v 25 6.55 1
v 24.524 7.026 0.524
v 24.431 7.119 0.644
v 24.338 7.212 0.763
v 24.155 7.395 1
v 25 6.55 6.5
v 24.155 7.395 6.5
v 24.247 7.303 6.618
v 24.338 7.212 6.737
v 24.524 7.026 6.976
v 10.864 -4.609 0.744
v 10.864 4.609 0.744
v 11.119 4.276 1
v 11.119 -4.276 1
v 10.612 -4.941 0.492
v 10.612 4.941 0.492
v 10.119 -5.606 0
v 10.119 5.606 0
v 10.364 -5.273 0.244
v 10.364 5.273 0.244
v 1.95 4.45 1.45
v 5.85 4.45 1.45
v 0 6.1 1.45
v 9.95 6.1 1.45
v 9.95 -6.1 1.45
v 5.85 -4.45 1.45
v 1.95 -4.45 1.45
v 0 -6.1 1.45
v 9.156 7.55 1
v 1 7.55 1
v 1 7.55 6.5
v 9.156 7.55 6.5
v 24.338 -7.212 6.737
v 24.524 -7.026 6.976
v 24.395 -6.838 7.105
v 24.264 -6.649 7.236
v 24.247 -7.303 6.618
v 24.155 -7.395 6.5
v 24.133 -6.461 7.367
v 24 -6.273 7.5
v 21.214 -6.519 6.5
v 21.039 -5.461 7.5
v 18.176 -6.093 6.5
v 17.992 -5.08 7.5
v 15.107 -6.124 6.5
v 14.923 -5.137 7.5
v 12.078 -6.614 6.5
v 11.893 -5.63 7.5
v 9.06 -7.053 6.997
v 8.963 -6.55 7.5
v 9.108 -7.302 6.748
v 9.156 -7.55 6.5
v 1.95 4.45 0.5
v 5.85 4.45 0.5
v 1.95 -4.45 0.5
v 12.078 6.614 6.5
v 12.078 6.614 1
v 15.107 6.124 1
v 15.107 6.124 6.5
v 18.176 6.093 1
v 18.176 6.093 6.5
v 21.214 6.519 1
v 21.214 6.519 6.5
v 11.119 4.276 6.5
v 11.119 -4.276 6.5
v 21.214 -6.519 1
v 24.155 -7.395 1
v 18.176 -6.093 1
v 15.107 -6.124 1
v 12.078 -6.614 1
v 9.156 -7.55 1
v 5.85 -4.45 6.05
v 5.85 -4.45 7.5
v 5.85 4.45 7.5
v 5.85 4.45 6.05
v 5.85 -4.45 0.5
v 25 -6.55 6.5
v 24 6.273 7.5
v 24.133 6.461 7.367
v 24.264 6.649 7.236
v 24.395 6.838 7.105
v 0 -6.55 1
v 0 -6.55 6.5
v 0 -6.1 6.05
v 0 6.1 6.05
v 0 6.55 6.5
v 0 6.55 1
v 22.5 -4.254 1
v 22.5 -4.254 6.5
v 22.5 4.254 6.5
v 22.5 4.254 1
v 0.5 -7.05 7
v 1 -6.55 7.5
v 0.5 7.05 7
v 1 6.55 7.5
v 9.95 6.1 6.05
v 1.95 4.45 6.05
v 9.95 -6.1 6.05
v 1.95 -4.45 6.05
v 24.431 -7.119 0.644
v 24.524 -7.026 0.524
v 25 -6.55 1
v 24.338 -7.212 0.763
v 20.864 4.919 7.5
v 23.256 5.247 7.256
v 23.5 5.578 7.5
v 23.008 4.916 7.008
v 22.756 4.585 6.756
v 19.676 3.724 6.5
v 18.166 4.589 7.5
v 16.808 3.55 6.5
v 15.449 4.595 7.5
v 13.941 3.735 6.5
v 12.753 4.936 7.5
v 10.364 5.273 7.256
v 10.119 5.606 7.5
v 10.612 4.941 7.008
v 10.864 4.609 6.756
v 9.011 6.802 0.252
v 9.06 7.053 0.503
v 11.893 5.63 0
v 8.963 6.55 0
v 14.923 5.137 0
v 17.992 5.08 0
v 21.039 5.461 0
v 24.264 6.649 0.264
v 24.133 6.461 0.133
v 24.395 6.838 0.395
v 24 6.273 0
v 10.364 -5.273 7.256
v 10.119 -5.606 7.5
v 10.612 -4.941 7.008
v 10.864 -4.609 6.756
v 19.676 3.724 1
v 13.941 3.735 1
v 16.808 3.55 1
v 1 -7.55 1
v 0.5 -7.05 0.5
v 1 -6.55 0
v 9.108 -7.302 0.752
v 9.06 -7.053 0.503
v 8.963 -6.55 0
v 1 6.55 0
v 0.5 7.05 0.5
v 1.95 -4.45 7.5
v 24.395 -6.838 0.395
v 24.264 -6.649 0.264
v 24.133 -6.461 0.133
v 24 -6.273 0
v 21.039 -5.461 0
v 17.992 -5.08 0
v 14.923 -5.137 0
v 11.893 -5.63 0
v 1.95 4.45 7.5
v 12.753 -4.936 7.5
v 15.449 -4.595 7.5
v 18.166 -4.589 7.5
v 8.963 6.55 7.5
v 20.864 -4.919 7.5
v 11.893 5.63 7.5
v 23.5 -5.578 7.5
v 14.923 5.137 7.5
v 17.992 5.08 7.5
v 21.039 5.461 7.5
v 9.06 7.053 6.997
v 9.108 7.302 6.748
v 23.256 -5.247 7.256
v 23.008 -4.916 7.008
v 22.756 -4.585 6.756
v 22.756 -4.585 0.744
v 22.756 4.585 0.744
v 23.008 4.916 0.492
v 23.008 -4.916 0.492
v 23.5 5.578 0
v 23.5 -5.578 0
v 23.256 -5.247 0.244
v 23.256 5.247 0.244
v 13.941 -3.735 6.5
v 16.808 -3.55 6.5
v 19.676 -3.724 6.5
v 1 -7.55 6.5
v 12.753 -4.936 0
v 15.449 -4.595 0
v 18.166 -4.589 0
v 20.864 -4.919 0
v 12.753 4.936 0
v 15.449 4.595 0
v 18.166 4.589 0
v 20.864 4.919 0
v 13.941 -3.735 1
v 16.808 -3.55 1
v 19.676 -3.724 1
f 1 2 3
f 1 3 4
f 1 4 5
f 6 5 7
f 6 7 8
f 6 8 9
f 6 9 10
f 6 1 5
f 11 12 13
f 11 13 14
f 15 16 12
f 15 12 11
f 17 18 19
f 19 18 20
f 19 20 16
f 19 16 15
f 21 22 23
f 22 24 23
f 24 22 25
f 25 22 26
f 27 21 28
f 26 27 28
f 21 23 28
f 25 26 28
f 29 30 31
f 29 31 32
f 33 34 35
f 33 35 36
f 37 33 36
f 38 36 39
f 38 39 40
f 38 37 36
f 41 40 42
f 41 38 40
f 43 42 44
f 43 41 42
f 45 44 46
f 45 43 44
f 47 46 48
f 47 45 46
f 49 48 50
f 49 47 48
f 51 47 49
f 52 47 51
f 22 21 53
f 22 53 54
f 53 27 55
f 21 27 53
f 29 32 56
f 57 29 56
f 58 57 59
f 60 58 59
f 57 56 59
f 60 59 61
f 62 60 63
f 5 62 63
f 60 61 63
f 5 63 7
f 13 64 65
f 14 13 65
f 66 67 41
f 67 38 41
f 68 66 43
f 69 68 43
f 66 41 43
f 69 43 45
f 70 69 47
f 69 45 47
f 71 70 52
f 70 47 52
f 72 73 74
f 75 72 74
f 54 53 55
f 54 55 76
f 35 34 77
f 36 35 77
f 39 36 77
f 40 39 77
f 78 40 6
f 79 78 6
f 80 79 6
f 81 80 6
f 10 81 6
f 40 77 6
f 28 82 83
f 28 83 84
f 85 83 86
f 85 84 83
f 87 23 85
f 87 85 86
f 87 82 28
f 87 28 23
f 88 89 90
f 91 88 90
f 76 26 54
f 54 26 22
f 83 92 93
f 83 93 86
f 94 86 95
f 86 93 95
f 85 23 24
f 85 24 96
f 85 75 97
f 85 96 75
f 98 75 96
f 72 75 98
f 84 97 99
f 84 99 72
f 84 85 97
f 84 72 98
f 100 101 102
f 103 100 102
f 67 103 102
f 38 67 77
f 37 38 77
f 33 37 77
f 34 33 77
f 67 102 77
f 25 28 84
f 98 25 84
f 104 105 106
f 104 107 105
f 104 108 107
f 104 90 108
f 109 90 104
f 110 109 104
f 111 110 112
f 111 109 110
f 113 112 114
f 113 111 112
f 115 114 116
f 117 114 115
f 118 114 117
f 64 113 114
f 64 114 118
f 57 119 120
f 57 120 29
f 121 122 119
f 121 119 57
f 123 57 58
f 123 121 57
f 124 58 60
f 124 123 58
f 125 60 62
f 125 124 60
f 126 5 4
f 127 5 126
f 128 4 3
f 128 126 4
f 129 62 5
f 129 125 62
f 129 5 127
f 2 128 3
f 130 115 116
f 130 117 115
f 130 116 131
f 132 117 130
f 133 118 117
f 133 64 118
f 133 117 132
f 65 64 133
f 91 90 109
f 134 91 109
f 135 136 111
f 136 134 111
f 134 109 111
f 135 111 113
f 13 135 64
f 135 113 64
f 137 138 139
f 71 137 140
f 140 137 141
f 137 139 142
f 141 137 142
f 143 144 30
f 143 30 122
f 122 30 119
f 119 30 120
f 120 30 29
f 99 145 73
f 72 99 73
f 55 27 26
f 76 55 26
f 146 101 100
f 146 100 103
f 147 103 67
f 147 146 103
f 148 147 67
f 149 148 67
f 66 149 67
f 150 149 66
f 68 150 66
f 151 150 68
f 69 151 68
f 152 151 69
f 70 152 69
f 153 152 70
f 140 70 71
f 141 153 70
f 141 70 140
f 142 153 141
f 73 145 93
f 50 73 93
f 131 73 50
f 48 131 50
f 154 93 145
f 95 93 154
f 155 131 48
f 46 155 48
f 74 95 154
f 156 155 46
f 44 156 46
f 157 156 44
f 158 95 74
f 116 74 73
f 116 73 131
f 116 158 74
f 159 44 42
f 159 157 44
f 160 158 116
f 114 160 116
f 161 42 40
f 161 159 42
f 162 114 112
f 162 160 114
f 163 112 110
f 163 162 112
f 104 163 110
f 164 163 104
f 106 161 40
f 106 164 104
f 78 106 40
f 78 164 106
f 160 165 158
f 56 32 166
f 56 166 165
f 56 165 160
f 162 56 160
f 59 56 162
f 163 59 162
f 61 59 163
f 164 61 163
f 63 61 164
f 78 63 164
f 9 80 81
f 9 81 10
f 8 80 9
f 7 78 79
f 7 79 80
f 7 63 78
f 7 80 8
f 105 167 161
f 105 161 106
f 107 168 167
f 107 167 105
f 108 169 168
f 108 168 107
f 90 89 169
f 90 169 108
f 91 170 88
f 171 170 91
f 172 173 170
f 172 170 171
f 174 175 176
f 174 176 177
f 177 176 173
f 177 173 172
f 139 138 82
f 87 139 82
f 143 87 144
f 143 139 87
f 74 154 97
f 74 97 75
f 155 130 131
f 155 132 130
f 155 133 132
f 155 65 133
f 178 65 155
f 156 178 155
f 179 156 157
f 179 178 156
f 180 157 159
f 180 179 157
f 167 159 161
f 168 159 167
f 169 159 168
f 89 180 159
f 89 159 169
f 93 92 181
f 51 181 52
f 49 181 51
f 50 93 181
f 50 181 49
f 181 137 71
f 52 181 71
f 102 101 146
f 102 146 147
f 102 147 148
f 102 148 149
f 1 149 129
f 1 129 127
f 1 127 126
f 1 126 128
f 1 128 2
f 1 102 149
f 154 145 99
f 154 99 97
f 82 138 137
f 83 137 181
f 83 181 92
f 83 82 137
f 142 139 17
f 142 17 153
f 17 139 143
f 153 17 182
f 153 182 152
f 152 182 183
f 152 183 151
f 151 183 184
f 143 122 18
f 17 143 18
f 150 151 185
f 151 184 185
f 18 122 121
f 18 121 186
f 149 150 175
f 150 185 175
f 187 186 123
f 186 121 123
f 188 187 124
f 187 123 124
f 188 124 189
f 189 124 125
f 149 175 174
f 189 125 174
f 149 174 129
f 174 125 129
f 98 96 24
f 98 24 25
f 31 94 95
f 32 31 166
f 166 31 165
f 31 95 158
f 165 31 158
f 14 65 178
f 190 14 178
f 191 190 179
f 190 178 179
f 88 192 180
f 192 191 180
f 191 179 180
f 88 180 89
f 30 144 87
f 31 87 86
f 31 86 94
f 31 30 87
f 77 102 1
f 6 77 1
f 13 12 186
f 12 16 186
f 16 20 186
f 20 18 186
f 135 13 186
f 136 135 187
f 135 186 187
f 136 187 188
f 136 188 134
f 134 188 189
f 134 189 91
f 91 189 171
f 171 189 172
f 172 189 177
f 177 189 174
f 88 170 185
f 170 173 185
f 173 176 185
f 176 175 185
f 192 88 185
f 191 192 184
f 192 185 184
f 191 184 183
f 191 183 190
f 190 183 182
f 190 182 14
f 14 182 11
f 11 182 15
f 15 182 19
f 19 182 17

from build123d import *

# Parameters (mm, degrees)
F0_W         = 25
F0_H         = 15.1
F1_DEPTH     = 7.5
F2_W         = 12.2
F2_H         = 4.6
F3_DEPTH     = 9.95
F4_W         = 3.9
F4_H         = 8.9
F5_DEPTH     = 25
F6_SIZE      = 1
F7_C1_SIZE   = 1
F7_C2_SIZE   = 1
F7_C3_SIZE   = 1
F7_C4_SIZE   = 1
F7_C5_SIZE   = 1
F7_C6_SIZE   = 1
F7_C7_SIZE   = 1
F7_C8_SIZE   = 1
F8_R         = 20.5
F9_DEPTH     = 25
F10_T2_ANGLE = 49.7995158882
F10_T4_ANGLE = 49.7995158882
F10_T6_ANGLE = 49.7995158882
F10_T8_ANGLE = 49.7995158882
F12_DEPTH    = 25
F13_SIZE     = 1
F14_W        = 6.9057337241
F14_H        = 9.9417776801
F15_DEPTH    = 0.5


# Not quite as in the source:
# - a fillet or chamfer that OpenCascade refuses, or shapes differently, is made with other operations: its cross-section is extruded or revolved along the edge and cut away or added


with BuildPart() as f1:
    # F0 (on Top) → F1 (new body)
    with BuildSketch(Plane.XY):
        with Locations((12.5, 0)):
            Rectangle(F0_W, F0_H)
    extrude(amount=F1_DEPTH)

    # F2 (on face) → F3 (cut)
    with BuildSketch(Plane(origin=(0, 0, 0), x_dir=(0, -1, 0), z_dir=(-1, 0, 0))):
        with Locations((0, 3.75)):
            Rectangle(F2_W, F2_H)
    extrude(amount=-F3_DEPTH, mode=Mode.SUBTRACT)

    # F4 (on face) → F5 (cut)
    with BuildSketch(Plane.XY.offset(7.5)):
        with Locations((3.9, 0)):
            Rectangle(F4_W, F4_H)
    extrude(amount=-F5_DEPTH, mode=Mode.SUBTRACT)

    # F6
    f6_edges = [f1.edges().sort_by_distance(p)[0] for p in [
        (25, -7.55, 3.75),
        (25, 7.55, 3.75),
        (25, 0, 0),
        (25, 0, 7.5),
    ]]
    chamfer(f6_edges, length=F6_SIZE)

    # F7: chamfer of 1 on 8 edges, made by hand

    # F7_c1
    f7_c1_edges = [f1.edges().sort_by_distance(p)[0] for p in [
        (12, -7.55, 0),
    ]]
    chamfer(f7_c1_edges, length=F7_C1_SIZE)

    # F7_c2
    f7_c2_edges = [f1.edges().sort_by_distance(p)[0] for p in [
        (0, -7.55, 4.25),
    ]]
    chamfer(f7_c2_edges, length=F7_C2_SIZE)

    # F7_c3
    f7_c3_edges = [f1.edges().sort_by_distance(p)[0] for p in [
        (12.5, -7.55, 7.5),
    ]]
    chamfer(f7_c3_edges, length=F7_C3_SIZE)

    # F7_c4
    f7_c4_edges = [f1.edges().sort_by_distance(p)[0] for p in [
        (0, 0.5, 0),
    ]]
    chamfer(f7_c4_edges, length=F7_C4_SIZE)

    # F7_c5
    f7_c5_edges = [f1.edges().sort_by_distance(p)[0] for p in [
        (12.5, 7.55, 0),
    ]]
    chamfer(f7_c5_edges, length=F7_C5_SIZE)

    # F7_c6
    f7_c6_edges = [f1.edges().sort_by_distance(p)[0] for p in [
        (0, 0.5, 7.5),
    ]]
    chamfer(f7_c6_edges, length=F7_C6_SIZE)

    # F7_c7
    f7_c7_edges = [f1.edges().sort_by_distance(p)[0] for p in [
        (12.5, 7.55, 7.5),
    ]]
    chamfer(f7_c7_edges, length=F7_C7_SIZE)

    # F7_c8
    f7_c8_edges = [f1.edges().sort_by_distance(p)[0] for p in [
        (0, 7.55, 3.75),
    ]]
    chamfer(f7_c8_edges, length=F7_C8_SIZE)

    # F8 (on face) → F9 (cut)
    with BuildSketch(Plane.XY.offset(7.5)):
        with Locations((16.8532188982, 26.55)):
            Circle(F8_R)
        with Locations((16.8532188982, -26.55)):
            Circle(F8_R)
    extrude(amount=-F9_DEPTH, mode=Mode.SUBTRACT)

    # F10: chamfer of 1 on 4 edges, made by hand

    # F10_s1 → F10_t2 (revolve, cut)
    with BuildSketch(Plane(origin=(24.005003563, -11.1426284002, 0), x_dir=(0, 0, 1), z_dir=(0.907045793, -0.4210319814, 0))):
        Polygon((7.5, -4.5136783409), (6.5, -3.5136783409), (7.5, -3.5136783409), align=None)
    revolve(axis=Axis((16.8532188982, -26.55, 7.5), (0, 0, 1)), revolution_arc=F10_T2_ANGLE, mode=Mode.SUBTRACT)

    # F10_s3 → F10_t4 (revolve, cut)
    with BuildSketch(Plane(origin=(3.7263637991, -1.7297013511, 0), x_dir=(0, 0, 1), z_dir=(-0.907045793, 0.4210319814, 0))):
        Polygon((7.5, 9.6778099504), (6.5, 10.6778099504), (7.5, 10.6778099504), align=None)
    revolve(axis=Axis((16.8532188982, 26.55, 7.5), (0, 0, 1)), revolution_arc=F10_T4_ANGLE, mode=Mode.SUBTRACT)

    # F10_s5 → F10_t6 (revolve, cut)
    with BuildSketch(Plane(origin=(24.005003563, -11.1426284002, 0), x_dir=(0, 0, 1), z_dir=(0.907045793, -0.4210319814, 0))):
        Polygon((1, -3.5136783409), (0, -4.5136783409), (0, -3.5136783409), align=None)
    revolve(axis=Axis((16.8532188982, -26.55, 0), (0, 0, 1)), revolution_arc=F10_T6_ANGLE, mode=Mode.SUBTRACT)

    # F10_s7 → F10_t8 (revolve, cut)
    with BuildSketch(Plane(origin=(3.7263637991, -1.7297013511, 0), x_dir=(0, 0, 1), z_dir=(-0.907045793, 0.4210319814, 0))):
        Polygon((1, 10.6778099504), (0, 9.6778099504), (0, 10.6778099504), align=None)
    revolve(axis=Axis((16.8532188982, 26.55, 0), (0, 0, 1)), revolution_arc=F10_T8_ANGLE, mode=Mode.SUBTRACT)

    # F11 (on face) → F12 (cut)
    with BuildSketch(Plane.XY.offset(7.5)):
        with BuildLine():
            ThreePointArc((11.1193139957, -4.2761962258), (16.8082592809, -3.5500439428), (22.5, -4.2539496056))
            Line((22.5, -4.2539496056), (22.5, 4.2539496056))
            ThreePointArc((22.5, 4.2539496056), (16.8082592809, 3.5500439428), (11.1193139957, 4.2761962258))
            Line((11.1193139957, 4.2761962258), (11.1193139957, -4.2761962258))
        make_face()
    extrude(amount=-F12_DEPTH, mode=Mode.SUBTRACT)

    # F13
    f13_edges = [f1.edges().sort_by_distance(p)[0] for p in [
        (11.119314, 0, 7.5),
        (16.808259, 3.550044, 7.5),
        (22.5, 0, 7.5),
        (16.808259, -3.550044, 7.5),
        (11.119314, 0, 0),
        (16.808259, 3.550044, 0),
        (22.5, 0, 0),
        (16.808259, -3.550044, 0),
    ]]
    chamfer(f13_edges, length=F13_SIZE)

    # F14 (on face) → F15 (join)
    with BuildSketch(Plane(origin=(0, 0, 0), x_dir=(1, 0, 0), z_dir=(0, 0, -1))):
        with Locations((4.9177300534, -0.0320777763)):
            Rectangle(F14_W, F14_H)
    extrude(amount=-F15_DEPTH)


solid = f1.part
